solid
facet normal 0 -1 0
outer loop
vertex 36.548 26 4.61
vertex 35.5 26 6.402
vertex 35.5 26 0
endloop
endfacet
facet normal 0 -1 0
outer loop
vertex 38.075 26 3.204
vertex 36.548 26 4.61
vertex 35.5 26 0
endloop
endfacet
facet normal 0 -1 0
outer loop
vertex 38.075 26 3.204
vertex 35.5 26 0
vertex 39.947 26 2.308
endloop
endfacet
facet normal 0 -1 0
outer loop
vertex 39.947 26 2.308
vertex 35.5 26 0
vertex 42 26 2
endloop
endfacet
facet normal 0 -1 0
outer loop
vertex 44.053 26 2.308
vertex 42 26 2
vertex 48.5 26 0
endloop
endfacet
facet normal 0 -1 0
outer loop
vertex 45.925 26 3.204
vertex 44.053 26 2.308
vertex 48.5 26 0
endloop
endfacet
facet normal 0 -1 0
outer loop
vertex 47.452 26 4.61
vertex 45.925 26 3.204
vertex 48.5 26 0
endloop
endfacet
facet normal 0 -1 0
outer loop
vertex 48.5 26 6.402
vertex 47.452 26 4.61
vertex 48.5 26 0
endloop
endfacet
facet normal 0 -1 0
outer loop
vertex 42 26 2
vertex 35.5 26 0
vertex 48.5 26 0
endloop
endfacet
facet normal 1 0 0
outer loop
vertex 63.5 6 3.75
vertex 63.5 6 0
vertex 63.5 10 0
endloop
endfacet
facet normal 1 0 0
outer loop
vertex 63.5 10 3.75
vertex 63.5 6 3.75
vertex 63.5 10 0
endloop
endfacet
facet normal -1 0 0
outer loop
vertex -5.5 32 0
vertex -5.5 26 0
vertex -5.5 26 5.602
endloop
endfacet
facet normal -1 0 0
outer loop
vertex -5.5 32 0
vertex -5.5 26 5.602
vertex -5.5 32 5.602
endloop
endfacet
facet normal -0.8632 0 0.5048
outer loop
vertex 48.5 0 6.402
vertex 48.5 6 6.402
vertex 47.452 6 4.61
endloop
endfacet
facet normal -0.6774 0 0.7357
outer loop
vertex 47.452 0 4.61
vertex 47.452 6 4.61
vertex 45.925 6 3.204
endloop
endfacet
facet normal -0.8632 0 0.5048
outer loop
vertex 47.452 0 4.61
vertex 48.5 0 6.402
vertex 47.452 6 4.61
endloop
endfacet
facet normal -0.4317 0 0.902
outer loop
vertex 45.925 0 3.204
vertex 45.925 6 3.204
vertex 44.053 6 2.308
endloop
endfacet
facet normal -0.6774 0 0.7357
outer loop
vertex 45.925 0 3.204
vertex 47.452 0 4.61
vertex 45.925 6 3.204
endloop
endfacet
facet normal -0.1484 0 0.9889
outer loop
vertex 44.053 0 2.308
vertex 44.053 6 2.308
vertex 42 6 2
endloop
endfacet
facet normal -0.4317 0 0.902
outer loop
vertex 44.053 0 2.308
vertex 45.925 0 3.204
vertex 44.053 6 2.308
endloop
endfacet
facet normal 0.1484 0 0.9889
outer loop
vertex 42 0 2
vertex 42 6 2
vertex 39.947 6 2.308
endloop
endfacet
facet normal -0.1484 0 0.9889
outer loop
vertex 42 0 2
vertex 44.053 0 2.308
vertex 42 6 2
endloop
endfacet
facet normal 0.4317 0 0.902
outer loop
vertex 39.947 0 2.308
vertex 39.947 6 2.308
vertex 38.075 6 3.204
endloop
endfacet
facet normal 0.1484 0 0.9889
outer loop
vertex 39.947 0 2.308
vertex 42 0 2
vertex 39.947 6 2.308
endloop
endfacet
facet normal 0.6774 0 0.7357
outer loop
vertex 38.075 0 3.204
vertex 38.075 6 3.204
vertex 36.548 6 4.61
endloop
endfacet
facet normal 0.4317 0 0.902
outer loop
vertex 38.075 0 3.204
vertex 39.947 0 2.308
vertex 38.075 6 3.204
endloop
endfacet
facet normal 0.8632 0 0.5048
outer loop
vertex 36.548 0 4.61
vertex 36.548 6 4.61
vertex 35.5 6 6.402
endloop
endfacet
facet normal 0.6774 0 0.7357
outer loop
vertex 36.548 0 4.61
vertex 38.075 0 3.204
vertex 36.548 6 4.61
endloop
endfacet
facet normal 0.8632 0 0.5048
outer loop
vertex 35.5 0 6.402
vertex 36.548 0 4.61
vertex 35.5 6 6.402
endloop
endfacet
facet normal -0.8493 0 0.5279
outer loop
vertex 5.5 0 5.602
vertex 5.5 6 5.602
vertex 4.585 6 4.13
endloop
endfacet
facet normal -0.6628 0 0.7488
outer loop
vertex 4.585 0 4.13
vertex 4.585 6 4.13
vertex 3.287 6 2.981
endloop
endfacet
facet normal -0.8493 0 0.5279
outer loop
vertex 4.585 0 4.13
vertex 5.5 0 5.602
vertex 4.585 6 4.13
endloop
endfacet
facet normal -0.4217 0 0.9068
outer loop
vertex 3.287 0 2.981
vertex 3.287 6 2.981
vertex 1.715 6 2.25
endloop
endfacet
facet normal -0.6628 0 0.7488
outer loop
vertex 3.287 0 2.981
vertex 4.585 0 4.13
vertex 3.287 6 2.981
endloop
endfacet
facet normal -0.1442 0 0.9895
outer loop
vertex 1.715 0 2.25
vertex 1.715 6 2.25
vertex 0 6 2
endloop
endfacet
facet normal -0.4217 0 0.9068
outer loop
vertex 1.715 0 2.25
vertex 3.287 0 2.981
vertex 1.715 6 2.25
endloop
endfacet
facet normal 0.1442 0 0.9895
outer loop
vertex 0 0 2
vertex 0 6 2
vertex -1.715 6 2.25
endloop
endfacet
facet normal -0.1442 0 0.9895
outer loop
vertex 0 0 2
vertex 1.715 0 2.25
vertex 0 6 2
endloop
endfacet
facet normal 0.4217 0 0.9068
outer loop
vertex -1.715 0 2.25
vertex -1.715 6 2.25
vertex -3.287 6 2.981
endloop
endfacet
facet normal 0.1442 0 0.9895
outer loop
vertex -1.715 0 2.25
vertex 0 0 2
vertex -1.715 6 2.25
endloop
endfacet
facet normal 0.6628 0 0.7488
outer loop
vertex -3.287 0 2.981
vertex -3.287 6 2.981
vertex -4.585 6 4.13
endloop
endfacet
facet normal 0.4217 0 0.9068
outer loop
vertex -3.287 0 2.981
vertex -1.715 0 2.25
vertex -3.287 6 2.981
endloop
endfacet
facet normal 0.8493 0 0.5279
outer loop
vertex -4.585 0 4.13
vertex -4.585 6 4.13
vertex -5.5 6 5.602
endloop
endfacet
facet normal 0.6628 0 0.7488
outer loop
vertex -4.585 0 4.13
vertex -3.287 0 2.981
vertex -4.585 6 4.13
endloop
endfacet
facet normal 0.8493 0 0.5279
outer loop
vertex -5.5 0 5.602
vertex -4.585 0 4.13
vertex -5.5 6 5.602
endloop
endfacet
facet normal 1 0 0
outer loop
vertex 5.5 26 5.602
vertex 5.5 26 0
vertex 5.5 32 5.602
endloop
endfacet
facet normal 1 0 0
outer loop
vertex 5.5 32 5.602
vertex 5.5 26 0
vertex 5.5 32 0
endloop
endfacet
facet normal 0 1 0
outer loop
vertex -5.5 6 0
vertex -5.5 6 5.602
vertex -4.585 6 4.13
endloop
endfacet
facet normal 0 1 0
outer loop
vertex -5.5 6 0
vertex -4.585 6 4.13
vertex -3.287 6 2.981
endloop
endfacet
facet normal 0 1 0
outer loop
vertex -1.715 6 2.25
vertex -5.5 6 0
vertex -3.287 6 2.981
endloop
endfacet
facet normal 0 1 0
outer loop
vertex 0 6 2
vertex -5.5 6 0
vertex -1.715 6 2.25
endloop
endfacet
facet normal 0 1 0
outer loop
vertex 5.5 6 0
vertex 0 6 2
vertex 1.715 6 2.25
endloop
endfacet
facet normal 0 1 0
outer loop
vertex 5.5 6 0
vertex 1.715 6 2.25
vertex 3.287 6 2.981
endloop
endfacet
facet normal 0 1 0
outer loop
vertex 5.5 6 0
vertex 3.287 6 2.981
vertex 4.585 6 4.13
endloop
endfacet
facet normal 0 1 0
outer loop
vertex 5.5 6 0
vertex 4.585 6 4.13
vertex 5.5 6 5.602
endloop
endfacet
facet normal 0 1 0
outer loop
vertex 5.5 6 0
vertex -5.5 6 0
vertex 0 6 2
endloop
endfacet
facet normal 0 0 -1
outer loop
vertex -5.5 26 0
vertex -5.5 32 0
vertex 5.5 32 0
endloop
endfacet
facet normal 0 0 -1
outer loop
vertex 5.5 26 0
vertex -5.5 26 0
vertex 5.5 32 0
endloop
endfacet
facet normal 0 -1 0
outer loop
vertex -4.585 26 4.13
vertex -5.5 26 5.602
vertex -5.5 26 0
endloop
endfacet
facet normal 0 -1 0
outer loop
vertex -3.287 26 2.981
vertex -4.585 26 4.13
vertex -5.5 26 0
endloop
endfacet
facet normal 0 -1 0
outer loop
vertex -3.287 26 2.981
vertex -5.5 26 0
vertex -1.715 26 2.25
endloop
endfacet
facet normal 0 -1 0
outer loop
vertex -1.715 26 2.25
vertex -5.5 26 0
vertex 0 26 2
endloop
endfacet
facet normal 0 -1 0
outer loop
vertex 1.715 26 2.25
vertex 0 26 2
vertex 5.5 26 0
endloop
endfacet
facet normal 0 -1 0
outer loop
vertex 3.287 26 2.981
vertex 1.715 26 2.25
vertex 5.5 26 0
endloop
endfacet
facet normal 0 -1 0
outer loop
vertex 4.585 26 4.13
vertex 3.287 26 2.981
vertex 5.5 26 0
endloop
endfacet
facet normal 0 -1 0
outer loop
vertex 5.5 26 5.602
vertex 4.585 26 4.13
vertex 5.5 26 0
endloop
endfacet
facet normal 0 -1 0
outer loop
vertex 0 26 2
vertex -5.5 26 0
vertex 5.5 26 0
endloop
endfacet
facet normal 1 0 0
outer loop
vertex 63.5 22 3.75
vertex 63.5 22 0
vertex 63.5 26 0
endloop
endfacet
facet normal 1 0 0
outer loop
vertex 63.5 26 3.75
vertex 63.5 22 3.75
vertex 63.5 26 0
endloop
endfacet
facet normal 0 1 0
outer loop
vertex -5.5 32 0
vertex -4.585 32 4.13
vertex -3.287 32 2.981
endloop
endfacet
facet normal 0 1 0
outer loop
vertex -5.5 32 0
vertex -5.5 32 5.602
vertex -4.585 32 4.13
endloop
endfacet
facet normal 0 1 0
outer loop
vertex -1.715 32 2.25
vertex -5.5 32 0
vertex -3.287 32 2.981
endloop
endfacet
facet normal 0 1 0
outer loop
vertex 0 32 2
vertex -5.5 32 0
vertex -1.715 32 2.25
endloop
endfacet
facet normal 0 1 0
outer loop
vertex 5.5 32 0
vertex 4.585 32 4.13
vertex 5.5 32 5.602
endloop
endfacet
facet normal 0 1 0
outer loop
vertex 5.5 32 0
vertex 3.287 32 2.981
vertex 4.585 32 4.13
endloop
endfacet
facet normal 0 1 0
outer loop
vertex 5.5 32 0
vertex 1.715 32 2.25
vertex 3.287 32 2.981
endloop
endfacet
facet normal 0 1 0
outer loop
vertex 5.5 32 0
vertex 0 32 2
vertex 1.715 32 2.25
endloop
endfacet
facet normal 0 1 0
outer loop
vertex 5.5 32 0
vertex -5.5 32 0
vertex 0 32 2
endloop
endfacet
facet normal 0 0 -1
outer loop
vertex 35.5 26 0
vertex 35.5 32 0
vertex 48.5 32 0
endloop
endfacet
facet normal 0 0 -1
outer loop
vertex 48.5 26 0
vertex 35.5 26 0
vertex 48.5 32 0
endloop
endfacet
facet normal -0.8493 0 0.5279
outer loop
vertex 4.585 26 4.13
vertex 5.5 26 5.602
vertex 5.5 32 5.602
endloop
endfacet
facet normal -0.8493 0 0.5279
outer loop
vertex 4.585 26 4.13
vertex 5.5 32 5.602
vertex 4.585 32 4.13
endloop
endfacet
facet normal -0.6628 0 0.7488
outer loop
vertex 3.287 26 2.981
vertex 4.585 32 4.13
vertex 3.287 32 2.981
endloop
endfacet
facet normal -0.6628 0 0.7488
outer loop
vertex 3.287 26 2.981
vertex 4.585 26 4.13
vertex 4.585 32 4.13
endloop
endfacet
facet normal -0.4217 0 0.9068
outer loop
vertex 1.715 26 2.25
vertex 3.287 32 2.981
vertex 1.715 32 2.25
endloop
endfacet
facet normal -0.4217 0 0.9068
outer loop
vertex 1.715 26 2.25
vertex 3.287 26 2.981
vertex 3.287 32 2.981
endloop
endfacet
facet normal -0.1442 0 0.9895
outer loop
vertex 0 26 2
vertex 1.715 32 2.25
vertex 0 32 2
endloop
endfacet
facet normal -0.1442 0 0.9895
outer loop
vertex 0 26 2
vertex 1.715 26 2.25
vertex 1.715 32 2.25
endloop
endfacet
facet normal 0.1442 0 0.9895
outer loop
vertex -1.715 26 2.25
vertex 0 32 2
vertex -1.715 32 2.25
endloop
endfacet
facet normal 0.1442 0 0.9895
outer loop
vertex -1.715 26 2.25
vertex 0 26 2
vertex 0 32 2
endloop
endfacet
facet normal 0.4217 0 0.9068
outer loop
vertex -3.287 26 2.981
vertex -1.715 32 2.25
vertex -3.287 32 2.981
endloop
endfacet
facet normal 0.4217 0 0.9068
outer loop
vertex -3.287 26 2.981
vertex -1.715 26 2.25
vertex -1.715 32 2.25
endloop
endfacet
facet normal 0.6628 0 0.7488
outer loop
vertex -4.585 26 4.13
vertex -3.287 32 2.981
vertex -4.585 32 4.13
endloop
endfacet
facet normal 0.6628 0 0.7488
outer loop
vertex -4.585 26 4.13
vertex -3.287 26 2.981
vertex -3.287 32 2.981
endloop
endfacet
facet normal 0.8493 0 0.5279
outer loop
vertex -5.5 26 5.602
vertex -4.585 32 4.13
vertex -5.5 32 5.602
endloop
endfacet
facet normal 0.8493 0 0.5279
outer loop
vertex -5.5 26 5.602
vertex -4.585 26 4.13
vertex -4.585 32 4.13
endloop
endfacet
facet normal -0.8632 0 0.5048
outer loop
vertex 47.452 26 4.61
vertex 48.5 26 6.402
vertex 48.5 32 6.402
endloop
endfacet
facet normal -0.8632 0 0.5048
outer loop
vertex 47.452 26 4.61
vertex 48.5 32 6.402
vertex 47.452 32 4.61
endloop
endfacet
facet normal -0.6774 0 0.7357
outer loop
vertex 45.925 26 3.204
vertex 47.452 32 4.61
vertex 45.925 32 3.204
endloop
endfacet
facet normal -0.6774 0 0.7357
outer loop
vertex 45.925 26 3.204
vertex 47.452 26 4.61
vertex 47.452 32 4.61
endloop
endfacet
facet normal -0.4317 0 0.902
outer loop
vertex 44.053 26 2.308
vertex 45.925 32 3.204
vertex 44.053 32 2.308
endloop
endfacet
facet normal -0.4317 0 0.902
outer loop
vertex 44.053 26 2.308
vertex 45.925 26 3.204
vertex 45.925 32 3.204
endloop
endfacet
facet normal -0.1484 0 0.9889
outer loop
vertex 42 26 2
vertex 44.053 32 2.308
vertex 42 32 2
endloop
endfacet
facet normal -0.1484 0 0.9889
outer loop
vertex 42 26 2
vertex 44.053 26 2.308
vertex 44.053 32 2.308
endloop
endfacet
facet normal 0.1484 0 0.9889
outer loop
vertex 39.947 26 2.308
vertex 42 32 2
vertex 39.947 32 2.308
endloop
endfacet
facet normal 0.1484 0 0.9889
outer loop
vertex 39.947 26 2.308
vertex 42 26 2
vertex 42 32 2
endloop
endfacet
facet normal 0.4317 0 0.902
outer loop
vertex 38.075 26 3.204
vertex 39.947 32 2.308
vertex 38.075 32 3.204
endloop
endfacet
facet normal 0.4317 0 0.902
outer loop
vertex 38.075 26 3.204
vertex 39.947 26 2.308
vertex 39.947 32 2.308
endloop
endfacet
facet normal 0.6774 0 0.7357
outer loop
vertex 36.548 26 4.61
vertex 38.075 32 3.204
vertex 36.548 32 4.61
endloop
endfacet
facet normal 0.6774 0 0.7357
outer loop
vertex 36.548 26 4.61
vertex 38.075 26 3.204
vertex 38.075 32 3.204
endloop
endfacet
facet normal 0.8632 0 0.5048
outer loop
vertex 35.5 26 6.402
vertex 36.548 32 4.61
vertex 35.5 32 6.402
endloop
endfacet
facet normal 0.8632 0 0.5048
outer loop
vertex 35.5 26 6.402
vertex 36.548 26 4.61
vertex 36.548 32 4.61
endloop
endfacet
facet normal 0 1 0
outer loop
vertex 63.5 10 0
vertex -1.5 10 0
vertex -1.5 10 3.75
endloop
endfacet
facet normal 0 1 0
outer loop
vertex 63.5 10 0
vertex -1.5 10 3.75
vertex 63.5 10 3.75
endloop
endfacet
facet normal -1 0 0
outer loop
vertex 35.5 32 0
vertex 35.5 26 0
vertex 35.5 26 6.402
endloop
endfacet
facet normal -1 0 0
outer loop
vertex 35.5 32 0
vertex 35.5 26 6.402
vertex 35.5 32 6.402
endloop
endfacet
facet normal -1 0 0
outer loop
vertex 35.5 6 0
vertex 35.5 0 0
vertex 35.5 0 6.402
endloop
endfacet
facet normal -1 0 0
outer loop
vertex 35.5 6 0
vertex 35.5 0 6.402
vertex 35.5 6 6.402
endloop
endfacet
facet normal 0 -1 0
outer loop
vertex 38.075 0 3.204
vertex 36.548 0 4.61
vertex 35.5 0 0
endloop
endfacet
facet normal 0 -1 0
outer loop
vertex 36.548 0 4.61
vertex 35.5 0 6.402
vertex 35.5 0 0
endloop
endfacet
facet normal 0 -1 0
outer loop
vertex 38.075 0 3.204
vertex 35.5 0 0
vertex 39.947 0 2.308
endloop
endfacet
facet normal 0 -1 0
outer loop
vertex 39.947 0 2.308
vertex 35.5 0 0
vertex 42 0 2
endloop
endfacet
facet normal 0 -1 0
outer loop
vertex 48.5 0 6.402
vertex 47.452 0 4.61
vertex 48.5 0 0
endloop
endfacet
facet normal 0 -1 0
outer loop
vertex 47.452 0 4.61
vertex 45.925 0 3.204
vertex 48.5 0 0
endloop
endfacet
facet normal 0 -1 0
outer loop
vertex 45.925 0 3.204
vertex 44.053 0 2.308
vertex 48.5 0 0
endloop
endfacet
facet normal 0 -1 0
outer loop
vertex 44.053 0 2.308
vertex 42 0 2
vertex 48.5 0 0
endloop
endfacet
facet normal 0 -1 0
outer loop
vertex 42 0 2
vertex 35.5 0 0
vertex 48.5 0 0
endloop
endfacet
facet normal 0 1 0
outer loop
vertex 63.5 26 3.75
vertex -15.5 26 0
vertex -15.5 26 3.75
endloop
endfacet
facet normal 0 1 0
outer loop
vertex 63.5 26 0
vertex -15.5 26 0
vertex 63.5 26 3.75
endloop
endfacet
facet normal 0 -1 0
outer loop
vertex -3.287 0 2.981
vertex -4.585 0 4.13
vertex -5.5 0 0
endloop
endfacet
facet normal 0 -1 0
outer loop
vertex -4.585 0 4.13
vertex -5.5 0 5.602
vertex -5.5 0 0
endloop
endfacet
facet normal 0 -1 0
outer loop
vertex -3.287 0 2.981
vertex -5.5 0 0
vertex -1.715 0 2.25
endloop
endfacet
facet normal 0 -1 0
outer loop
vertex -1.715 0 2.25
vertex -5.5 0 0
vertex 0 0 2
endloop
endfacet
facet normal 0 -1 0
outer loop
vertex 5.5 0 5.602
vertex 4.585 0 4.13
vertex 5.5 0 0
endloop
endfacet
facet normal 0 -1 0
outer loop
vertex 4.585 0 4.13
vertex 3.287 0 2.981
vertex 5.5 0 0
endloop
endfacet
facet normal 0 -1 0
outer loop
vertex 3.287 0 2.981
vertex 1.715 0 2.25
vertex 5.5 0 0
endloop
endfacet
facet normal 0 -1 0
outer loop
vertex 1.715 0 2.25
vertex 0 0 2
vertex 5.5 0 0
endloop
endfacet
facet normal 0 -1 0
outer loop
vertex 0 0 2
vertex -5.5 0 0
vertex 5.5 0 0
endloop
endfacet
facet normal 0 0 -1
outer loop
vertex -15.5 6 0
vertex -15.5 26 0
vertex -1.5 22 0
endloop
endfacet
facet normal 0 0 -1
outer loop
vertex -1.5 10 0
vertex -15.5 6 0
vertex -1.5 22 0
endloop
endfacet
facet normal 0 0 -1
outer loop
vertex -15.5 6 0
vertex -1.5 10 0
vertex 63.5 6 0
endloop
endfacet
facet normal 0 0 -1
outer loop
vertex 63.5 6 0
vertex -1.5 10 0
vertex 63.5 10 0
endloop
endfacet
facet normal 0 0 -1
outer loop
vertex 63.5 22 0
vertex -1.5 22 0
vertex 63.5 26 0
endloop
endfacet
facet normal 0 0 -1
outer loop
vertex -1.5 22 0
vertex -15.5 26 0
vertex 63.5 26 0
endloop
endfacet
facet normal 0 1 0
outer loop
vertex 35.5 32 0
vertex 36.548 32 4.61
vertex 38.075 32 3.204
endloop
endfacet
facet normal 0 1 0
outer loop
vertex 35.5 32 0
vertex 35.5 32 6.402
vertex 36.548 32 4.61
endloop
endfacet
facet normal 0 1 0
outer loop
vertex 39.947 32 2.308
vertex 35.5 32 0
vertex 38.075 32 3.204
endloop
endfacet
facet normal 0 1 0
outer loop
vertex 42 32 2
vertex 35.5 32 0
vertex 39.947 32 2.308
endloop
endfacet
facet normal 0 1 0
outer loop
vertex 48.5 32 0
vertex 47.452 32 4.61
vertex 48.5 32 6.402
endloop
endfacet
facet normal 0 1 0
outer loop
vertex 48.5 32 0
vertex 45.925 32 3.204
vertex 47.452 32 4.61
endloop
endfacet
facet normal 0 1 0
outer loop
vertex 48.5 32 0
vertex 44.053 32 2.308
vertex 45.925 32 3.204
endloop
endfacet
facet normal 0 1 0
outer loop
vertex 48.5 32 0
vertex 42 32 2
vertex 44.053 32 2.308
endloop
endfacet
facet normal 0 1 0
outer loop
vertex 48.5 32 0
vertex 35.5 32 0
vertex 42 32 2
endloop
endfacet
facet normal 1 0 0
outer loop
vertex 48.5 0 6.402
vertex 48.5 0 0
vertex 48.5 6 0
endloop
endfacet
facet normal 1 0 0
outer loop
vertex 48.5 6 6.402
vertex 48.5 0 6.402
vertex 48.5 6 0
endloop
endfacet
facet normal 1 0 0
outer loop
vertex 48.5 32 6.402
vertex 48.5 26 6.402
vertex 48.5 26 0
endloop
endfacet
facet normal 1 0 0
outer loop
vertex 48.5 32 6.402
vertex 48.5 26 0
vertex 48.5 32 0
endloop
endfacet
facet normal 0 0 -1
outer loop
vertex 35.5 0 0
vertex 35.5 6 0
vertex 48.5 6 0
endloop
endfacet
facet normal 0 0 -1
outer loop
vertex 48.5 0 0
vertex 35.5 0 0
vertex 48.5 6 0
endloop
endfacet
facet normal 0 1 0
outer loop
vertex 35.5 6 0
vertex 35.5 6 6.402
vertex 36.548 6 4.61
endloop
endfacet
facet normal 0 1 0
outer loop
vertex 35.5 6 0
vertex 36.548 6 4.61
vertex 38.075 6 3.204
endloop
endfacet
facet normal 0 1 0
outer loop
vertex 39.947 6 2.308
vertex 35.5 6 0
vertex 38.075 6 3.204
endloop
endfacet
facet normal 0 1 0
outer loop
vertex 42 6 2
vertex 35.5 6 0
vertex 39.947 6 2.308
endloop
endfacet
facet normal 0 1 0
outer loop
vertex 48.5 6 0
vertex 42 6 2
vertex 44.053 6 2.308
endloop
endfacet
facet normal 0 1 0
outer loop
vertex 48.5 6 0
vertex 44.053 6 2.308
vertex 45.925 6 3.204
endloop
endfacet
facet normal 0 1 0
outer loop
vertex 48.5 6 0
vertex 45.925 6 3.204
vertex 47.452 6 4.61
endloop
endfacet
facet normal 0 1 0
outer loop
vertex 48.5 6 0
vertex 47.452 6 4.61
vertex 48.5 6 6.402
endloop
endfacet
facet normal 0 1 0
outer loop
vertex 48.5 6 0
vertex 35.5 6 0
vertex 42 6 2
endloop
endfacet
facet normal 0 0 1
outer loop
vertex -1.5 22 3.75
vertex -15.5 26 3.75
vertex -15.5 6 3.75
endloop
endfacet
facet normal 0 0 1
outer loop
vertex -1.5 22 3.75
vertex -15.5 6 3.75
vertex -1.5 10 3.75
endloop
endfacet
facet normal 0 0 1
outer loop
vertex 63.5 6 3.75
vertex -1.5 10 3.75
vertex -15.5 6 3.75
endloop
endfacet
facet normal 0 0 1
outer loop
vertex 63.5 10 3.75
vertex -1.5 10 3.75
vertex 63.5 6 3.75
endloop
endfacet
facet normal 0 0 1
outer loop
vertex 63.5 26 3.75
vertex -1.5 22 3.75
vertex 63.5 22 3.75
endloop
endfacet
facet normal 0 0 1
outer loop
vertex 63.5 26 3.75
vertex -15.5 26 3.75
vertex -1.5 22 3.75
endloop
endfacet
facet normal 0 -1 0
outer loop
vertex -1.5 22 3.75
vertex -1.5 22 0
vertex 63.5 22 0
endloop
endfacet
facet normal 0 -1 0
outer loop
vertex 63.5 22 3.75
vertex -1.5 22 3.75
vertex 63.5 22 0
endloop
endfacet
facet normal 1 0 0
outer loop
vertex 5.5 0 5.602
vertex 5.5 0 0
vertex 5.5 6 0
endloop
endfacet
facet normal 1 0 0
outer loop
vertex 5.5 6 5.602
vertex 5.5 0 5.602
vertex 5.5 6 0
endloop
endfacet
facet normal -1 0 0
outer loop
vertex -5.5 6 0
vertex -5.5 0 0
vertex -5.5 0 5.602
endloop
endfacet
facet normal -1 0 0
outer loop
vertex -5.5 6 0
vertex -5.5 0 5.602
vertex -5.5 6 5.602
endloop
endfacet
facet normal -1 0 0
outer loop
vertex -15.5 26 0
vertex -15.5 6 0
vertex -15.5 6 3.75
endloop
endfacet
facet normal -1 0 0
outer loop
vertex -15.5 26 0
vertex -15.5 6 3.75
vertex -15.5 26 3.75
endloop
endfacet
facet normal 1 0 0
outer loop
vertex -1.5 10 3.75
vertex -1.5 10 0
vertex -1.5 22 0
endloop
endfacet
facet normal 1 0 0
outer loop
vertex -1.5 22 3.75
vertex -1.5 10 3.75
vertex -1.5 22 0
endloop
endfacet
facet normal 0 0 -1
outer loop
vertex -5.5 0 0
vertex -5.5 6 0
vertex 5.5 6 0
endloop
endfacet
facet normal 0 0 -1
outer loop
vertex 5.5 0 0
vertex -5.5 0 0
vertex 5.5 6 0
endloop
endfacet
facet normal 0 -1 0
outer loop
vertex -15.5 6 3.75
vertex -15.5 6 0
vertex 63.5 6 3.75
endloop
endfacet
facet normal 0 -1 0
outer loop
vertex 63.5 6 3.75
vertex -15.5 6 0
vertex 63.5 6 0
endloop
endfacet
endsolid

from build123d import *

# Parameters (mm, degrees)
BOX016_W          = 54
BOX016_H          = 20
BOX016_DEPTH      = 10
CYLINDER001_R     = 7
CYLINDER001_DEPTH = 32
BOX015_W          = 13
BOX015_H          = 32
BOX015_DEPTH      = 8
CYLINDER_R        = 6
CYLINDER_DEPTH    = 32
BOX_W             = 11
BOX_H             = 32
BOX_DEPTH         = 8
BOX017_W          = 71
BOX017_H          = 12
BOX017_DEPTH      = 3.75
BOX008_W          = 79
BOX008_H          = 20
BOX008_DEPTH      = 3.75


with BuildPart() as basecutout:
    # Box016 → Box016 (new body)
    with BuildSketch(Plane(origin=(-5.5, 6, 0), x_dir=(1, 0, 0), z_dir=(0, 0, 1))):
        with Locations((27, 10)):
            Rectangle(BOX016_W, BOX016_H)
    extrude(amount=BOX016_DEPTH)


with BuildPart() as cylinder001:
    # Cylinder001 → Cylinder001 (new body)
    with BuildSketch(Plane(origin=(42, 0, 9), x_dir=(1, 0, 0), z_dir=(0, 1, 0))):
        Circle(CYLINDER001_R)
    extrude(amount=CYLINDER001_DEPTH)


with BuildPart() as rearaxle:
    # Box015 → Box015 (new body)
    with BuildSketch(Plane(origin=(35.5, 0, 0), x_dir=(1, 0, 0), z_dir=(0, 0, 1))):
        with Locations((6.5, 16)):
            Rectangle(BOX015_W, BOX015_H)
    extrude(amount=BOX015_DEPTH)

    # Cut004: cut Cylinder001
    add(cylinder001.part, mode=Mode.SUBTRACT)


with BuildPart() as cylinder:
    # Cylinder → Cylinder (new body)
    with BuildSketch(Plane(origin=(0, 0, 8), x_dir=(1, 0, 0), z_dir=(0, 1, 0))):
        Circle(CYLINDER_R)
    extrude(amount=CYLINDER_DEPTH)


with BuildPart() as cut005:
    # Box → Box (new body)
    with BuildSketch(Plane(origin=(-5.5, 0, 0), x_dir=(1, 0, 0), z_dir=(0, 0, 1))):
        with Locations((5.5, 16)):
            Rectangle(BOX_W, BOX_H)
    extrude(amount=BOX_DEPTH)

    # Cut: cut Cylinder
    add(cylinder.part, mode=Mode.SUBTRACT)

    # Fusion: union RearAxle
    add(rearaxle.part)

    # Cut005: cut basecutout
    add(basecutout.part, mode=Mode.SUBTRACT)


with BuildPart() as basecutout001:
    # Box017 → Box017 (new body)
    with BuildSketch(Plane(origin=(-1.5, 10, 0), x_dir=(1, 0, 0), z_dir=(0, 0, 1))):
        with Locations((35.5, 6)):
            Rectangle(BOX017_W, BOX017_H)
    extrude(amount=BOX017_DEPTH)


with BuildPart() as cut006:
    # Box008 → Box008 (new body)
    with BuildSketch(Plane(origin=(-15.5, 6, 0), x_dir=(1, 0, 0), z_dir=(0, 0, 1))):
        with Locations((39.5, 10)):
            Rectangle(BOX008_W, BOX008_H)
    extrude(amount=BOX008_DEPTH)

    # Cut006: cut basecutout001
    add(basecutout001.part, mode=Mode.SUBTRACT)


solid = Compound([cut005.part, cut006.part])
